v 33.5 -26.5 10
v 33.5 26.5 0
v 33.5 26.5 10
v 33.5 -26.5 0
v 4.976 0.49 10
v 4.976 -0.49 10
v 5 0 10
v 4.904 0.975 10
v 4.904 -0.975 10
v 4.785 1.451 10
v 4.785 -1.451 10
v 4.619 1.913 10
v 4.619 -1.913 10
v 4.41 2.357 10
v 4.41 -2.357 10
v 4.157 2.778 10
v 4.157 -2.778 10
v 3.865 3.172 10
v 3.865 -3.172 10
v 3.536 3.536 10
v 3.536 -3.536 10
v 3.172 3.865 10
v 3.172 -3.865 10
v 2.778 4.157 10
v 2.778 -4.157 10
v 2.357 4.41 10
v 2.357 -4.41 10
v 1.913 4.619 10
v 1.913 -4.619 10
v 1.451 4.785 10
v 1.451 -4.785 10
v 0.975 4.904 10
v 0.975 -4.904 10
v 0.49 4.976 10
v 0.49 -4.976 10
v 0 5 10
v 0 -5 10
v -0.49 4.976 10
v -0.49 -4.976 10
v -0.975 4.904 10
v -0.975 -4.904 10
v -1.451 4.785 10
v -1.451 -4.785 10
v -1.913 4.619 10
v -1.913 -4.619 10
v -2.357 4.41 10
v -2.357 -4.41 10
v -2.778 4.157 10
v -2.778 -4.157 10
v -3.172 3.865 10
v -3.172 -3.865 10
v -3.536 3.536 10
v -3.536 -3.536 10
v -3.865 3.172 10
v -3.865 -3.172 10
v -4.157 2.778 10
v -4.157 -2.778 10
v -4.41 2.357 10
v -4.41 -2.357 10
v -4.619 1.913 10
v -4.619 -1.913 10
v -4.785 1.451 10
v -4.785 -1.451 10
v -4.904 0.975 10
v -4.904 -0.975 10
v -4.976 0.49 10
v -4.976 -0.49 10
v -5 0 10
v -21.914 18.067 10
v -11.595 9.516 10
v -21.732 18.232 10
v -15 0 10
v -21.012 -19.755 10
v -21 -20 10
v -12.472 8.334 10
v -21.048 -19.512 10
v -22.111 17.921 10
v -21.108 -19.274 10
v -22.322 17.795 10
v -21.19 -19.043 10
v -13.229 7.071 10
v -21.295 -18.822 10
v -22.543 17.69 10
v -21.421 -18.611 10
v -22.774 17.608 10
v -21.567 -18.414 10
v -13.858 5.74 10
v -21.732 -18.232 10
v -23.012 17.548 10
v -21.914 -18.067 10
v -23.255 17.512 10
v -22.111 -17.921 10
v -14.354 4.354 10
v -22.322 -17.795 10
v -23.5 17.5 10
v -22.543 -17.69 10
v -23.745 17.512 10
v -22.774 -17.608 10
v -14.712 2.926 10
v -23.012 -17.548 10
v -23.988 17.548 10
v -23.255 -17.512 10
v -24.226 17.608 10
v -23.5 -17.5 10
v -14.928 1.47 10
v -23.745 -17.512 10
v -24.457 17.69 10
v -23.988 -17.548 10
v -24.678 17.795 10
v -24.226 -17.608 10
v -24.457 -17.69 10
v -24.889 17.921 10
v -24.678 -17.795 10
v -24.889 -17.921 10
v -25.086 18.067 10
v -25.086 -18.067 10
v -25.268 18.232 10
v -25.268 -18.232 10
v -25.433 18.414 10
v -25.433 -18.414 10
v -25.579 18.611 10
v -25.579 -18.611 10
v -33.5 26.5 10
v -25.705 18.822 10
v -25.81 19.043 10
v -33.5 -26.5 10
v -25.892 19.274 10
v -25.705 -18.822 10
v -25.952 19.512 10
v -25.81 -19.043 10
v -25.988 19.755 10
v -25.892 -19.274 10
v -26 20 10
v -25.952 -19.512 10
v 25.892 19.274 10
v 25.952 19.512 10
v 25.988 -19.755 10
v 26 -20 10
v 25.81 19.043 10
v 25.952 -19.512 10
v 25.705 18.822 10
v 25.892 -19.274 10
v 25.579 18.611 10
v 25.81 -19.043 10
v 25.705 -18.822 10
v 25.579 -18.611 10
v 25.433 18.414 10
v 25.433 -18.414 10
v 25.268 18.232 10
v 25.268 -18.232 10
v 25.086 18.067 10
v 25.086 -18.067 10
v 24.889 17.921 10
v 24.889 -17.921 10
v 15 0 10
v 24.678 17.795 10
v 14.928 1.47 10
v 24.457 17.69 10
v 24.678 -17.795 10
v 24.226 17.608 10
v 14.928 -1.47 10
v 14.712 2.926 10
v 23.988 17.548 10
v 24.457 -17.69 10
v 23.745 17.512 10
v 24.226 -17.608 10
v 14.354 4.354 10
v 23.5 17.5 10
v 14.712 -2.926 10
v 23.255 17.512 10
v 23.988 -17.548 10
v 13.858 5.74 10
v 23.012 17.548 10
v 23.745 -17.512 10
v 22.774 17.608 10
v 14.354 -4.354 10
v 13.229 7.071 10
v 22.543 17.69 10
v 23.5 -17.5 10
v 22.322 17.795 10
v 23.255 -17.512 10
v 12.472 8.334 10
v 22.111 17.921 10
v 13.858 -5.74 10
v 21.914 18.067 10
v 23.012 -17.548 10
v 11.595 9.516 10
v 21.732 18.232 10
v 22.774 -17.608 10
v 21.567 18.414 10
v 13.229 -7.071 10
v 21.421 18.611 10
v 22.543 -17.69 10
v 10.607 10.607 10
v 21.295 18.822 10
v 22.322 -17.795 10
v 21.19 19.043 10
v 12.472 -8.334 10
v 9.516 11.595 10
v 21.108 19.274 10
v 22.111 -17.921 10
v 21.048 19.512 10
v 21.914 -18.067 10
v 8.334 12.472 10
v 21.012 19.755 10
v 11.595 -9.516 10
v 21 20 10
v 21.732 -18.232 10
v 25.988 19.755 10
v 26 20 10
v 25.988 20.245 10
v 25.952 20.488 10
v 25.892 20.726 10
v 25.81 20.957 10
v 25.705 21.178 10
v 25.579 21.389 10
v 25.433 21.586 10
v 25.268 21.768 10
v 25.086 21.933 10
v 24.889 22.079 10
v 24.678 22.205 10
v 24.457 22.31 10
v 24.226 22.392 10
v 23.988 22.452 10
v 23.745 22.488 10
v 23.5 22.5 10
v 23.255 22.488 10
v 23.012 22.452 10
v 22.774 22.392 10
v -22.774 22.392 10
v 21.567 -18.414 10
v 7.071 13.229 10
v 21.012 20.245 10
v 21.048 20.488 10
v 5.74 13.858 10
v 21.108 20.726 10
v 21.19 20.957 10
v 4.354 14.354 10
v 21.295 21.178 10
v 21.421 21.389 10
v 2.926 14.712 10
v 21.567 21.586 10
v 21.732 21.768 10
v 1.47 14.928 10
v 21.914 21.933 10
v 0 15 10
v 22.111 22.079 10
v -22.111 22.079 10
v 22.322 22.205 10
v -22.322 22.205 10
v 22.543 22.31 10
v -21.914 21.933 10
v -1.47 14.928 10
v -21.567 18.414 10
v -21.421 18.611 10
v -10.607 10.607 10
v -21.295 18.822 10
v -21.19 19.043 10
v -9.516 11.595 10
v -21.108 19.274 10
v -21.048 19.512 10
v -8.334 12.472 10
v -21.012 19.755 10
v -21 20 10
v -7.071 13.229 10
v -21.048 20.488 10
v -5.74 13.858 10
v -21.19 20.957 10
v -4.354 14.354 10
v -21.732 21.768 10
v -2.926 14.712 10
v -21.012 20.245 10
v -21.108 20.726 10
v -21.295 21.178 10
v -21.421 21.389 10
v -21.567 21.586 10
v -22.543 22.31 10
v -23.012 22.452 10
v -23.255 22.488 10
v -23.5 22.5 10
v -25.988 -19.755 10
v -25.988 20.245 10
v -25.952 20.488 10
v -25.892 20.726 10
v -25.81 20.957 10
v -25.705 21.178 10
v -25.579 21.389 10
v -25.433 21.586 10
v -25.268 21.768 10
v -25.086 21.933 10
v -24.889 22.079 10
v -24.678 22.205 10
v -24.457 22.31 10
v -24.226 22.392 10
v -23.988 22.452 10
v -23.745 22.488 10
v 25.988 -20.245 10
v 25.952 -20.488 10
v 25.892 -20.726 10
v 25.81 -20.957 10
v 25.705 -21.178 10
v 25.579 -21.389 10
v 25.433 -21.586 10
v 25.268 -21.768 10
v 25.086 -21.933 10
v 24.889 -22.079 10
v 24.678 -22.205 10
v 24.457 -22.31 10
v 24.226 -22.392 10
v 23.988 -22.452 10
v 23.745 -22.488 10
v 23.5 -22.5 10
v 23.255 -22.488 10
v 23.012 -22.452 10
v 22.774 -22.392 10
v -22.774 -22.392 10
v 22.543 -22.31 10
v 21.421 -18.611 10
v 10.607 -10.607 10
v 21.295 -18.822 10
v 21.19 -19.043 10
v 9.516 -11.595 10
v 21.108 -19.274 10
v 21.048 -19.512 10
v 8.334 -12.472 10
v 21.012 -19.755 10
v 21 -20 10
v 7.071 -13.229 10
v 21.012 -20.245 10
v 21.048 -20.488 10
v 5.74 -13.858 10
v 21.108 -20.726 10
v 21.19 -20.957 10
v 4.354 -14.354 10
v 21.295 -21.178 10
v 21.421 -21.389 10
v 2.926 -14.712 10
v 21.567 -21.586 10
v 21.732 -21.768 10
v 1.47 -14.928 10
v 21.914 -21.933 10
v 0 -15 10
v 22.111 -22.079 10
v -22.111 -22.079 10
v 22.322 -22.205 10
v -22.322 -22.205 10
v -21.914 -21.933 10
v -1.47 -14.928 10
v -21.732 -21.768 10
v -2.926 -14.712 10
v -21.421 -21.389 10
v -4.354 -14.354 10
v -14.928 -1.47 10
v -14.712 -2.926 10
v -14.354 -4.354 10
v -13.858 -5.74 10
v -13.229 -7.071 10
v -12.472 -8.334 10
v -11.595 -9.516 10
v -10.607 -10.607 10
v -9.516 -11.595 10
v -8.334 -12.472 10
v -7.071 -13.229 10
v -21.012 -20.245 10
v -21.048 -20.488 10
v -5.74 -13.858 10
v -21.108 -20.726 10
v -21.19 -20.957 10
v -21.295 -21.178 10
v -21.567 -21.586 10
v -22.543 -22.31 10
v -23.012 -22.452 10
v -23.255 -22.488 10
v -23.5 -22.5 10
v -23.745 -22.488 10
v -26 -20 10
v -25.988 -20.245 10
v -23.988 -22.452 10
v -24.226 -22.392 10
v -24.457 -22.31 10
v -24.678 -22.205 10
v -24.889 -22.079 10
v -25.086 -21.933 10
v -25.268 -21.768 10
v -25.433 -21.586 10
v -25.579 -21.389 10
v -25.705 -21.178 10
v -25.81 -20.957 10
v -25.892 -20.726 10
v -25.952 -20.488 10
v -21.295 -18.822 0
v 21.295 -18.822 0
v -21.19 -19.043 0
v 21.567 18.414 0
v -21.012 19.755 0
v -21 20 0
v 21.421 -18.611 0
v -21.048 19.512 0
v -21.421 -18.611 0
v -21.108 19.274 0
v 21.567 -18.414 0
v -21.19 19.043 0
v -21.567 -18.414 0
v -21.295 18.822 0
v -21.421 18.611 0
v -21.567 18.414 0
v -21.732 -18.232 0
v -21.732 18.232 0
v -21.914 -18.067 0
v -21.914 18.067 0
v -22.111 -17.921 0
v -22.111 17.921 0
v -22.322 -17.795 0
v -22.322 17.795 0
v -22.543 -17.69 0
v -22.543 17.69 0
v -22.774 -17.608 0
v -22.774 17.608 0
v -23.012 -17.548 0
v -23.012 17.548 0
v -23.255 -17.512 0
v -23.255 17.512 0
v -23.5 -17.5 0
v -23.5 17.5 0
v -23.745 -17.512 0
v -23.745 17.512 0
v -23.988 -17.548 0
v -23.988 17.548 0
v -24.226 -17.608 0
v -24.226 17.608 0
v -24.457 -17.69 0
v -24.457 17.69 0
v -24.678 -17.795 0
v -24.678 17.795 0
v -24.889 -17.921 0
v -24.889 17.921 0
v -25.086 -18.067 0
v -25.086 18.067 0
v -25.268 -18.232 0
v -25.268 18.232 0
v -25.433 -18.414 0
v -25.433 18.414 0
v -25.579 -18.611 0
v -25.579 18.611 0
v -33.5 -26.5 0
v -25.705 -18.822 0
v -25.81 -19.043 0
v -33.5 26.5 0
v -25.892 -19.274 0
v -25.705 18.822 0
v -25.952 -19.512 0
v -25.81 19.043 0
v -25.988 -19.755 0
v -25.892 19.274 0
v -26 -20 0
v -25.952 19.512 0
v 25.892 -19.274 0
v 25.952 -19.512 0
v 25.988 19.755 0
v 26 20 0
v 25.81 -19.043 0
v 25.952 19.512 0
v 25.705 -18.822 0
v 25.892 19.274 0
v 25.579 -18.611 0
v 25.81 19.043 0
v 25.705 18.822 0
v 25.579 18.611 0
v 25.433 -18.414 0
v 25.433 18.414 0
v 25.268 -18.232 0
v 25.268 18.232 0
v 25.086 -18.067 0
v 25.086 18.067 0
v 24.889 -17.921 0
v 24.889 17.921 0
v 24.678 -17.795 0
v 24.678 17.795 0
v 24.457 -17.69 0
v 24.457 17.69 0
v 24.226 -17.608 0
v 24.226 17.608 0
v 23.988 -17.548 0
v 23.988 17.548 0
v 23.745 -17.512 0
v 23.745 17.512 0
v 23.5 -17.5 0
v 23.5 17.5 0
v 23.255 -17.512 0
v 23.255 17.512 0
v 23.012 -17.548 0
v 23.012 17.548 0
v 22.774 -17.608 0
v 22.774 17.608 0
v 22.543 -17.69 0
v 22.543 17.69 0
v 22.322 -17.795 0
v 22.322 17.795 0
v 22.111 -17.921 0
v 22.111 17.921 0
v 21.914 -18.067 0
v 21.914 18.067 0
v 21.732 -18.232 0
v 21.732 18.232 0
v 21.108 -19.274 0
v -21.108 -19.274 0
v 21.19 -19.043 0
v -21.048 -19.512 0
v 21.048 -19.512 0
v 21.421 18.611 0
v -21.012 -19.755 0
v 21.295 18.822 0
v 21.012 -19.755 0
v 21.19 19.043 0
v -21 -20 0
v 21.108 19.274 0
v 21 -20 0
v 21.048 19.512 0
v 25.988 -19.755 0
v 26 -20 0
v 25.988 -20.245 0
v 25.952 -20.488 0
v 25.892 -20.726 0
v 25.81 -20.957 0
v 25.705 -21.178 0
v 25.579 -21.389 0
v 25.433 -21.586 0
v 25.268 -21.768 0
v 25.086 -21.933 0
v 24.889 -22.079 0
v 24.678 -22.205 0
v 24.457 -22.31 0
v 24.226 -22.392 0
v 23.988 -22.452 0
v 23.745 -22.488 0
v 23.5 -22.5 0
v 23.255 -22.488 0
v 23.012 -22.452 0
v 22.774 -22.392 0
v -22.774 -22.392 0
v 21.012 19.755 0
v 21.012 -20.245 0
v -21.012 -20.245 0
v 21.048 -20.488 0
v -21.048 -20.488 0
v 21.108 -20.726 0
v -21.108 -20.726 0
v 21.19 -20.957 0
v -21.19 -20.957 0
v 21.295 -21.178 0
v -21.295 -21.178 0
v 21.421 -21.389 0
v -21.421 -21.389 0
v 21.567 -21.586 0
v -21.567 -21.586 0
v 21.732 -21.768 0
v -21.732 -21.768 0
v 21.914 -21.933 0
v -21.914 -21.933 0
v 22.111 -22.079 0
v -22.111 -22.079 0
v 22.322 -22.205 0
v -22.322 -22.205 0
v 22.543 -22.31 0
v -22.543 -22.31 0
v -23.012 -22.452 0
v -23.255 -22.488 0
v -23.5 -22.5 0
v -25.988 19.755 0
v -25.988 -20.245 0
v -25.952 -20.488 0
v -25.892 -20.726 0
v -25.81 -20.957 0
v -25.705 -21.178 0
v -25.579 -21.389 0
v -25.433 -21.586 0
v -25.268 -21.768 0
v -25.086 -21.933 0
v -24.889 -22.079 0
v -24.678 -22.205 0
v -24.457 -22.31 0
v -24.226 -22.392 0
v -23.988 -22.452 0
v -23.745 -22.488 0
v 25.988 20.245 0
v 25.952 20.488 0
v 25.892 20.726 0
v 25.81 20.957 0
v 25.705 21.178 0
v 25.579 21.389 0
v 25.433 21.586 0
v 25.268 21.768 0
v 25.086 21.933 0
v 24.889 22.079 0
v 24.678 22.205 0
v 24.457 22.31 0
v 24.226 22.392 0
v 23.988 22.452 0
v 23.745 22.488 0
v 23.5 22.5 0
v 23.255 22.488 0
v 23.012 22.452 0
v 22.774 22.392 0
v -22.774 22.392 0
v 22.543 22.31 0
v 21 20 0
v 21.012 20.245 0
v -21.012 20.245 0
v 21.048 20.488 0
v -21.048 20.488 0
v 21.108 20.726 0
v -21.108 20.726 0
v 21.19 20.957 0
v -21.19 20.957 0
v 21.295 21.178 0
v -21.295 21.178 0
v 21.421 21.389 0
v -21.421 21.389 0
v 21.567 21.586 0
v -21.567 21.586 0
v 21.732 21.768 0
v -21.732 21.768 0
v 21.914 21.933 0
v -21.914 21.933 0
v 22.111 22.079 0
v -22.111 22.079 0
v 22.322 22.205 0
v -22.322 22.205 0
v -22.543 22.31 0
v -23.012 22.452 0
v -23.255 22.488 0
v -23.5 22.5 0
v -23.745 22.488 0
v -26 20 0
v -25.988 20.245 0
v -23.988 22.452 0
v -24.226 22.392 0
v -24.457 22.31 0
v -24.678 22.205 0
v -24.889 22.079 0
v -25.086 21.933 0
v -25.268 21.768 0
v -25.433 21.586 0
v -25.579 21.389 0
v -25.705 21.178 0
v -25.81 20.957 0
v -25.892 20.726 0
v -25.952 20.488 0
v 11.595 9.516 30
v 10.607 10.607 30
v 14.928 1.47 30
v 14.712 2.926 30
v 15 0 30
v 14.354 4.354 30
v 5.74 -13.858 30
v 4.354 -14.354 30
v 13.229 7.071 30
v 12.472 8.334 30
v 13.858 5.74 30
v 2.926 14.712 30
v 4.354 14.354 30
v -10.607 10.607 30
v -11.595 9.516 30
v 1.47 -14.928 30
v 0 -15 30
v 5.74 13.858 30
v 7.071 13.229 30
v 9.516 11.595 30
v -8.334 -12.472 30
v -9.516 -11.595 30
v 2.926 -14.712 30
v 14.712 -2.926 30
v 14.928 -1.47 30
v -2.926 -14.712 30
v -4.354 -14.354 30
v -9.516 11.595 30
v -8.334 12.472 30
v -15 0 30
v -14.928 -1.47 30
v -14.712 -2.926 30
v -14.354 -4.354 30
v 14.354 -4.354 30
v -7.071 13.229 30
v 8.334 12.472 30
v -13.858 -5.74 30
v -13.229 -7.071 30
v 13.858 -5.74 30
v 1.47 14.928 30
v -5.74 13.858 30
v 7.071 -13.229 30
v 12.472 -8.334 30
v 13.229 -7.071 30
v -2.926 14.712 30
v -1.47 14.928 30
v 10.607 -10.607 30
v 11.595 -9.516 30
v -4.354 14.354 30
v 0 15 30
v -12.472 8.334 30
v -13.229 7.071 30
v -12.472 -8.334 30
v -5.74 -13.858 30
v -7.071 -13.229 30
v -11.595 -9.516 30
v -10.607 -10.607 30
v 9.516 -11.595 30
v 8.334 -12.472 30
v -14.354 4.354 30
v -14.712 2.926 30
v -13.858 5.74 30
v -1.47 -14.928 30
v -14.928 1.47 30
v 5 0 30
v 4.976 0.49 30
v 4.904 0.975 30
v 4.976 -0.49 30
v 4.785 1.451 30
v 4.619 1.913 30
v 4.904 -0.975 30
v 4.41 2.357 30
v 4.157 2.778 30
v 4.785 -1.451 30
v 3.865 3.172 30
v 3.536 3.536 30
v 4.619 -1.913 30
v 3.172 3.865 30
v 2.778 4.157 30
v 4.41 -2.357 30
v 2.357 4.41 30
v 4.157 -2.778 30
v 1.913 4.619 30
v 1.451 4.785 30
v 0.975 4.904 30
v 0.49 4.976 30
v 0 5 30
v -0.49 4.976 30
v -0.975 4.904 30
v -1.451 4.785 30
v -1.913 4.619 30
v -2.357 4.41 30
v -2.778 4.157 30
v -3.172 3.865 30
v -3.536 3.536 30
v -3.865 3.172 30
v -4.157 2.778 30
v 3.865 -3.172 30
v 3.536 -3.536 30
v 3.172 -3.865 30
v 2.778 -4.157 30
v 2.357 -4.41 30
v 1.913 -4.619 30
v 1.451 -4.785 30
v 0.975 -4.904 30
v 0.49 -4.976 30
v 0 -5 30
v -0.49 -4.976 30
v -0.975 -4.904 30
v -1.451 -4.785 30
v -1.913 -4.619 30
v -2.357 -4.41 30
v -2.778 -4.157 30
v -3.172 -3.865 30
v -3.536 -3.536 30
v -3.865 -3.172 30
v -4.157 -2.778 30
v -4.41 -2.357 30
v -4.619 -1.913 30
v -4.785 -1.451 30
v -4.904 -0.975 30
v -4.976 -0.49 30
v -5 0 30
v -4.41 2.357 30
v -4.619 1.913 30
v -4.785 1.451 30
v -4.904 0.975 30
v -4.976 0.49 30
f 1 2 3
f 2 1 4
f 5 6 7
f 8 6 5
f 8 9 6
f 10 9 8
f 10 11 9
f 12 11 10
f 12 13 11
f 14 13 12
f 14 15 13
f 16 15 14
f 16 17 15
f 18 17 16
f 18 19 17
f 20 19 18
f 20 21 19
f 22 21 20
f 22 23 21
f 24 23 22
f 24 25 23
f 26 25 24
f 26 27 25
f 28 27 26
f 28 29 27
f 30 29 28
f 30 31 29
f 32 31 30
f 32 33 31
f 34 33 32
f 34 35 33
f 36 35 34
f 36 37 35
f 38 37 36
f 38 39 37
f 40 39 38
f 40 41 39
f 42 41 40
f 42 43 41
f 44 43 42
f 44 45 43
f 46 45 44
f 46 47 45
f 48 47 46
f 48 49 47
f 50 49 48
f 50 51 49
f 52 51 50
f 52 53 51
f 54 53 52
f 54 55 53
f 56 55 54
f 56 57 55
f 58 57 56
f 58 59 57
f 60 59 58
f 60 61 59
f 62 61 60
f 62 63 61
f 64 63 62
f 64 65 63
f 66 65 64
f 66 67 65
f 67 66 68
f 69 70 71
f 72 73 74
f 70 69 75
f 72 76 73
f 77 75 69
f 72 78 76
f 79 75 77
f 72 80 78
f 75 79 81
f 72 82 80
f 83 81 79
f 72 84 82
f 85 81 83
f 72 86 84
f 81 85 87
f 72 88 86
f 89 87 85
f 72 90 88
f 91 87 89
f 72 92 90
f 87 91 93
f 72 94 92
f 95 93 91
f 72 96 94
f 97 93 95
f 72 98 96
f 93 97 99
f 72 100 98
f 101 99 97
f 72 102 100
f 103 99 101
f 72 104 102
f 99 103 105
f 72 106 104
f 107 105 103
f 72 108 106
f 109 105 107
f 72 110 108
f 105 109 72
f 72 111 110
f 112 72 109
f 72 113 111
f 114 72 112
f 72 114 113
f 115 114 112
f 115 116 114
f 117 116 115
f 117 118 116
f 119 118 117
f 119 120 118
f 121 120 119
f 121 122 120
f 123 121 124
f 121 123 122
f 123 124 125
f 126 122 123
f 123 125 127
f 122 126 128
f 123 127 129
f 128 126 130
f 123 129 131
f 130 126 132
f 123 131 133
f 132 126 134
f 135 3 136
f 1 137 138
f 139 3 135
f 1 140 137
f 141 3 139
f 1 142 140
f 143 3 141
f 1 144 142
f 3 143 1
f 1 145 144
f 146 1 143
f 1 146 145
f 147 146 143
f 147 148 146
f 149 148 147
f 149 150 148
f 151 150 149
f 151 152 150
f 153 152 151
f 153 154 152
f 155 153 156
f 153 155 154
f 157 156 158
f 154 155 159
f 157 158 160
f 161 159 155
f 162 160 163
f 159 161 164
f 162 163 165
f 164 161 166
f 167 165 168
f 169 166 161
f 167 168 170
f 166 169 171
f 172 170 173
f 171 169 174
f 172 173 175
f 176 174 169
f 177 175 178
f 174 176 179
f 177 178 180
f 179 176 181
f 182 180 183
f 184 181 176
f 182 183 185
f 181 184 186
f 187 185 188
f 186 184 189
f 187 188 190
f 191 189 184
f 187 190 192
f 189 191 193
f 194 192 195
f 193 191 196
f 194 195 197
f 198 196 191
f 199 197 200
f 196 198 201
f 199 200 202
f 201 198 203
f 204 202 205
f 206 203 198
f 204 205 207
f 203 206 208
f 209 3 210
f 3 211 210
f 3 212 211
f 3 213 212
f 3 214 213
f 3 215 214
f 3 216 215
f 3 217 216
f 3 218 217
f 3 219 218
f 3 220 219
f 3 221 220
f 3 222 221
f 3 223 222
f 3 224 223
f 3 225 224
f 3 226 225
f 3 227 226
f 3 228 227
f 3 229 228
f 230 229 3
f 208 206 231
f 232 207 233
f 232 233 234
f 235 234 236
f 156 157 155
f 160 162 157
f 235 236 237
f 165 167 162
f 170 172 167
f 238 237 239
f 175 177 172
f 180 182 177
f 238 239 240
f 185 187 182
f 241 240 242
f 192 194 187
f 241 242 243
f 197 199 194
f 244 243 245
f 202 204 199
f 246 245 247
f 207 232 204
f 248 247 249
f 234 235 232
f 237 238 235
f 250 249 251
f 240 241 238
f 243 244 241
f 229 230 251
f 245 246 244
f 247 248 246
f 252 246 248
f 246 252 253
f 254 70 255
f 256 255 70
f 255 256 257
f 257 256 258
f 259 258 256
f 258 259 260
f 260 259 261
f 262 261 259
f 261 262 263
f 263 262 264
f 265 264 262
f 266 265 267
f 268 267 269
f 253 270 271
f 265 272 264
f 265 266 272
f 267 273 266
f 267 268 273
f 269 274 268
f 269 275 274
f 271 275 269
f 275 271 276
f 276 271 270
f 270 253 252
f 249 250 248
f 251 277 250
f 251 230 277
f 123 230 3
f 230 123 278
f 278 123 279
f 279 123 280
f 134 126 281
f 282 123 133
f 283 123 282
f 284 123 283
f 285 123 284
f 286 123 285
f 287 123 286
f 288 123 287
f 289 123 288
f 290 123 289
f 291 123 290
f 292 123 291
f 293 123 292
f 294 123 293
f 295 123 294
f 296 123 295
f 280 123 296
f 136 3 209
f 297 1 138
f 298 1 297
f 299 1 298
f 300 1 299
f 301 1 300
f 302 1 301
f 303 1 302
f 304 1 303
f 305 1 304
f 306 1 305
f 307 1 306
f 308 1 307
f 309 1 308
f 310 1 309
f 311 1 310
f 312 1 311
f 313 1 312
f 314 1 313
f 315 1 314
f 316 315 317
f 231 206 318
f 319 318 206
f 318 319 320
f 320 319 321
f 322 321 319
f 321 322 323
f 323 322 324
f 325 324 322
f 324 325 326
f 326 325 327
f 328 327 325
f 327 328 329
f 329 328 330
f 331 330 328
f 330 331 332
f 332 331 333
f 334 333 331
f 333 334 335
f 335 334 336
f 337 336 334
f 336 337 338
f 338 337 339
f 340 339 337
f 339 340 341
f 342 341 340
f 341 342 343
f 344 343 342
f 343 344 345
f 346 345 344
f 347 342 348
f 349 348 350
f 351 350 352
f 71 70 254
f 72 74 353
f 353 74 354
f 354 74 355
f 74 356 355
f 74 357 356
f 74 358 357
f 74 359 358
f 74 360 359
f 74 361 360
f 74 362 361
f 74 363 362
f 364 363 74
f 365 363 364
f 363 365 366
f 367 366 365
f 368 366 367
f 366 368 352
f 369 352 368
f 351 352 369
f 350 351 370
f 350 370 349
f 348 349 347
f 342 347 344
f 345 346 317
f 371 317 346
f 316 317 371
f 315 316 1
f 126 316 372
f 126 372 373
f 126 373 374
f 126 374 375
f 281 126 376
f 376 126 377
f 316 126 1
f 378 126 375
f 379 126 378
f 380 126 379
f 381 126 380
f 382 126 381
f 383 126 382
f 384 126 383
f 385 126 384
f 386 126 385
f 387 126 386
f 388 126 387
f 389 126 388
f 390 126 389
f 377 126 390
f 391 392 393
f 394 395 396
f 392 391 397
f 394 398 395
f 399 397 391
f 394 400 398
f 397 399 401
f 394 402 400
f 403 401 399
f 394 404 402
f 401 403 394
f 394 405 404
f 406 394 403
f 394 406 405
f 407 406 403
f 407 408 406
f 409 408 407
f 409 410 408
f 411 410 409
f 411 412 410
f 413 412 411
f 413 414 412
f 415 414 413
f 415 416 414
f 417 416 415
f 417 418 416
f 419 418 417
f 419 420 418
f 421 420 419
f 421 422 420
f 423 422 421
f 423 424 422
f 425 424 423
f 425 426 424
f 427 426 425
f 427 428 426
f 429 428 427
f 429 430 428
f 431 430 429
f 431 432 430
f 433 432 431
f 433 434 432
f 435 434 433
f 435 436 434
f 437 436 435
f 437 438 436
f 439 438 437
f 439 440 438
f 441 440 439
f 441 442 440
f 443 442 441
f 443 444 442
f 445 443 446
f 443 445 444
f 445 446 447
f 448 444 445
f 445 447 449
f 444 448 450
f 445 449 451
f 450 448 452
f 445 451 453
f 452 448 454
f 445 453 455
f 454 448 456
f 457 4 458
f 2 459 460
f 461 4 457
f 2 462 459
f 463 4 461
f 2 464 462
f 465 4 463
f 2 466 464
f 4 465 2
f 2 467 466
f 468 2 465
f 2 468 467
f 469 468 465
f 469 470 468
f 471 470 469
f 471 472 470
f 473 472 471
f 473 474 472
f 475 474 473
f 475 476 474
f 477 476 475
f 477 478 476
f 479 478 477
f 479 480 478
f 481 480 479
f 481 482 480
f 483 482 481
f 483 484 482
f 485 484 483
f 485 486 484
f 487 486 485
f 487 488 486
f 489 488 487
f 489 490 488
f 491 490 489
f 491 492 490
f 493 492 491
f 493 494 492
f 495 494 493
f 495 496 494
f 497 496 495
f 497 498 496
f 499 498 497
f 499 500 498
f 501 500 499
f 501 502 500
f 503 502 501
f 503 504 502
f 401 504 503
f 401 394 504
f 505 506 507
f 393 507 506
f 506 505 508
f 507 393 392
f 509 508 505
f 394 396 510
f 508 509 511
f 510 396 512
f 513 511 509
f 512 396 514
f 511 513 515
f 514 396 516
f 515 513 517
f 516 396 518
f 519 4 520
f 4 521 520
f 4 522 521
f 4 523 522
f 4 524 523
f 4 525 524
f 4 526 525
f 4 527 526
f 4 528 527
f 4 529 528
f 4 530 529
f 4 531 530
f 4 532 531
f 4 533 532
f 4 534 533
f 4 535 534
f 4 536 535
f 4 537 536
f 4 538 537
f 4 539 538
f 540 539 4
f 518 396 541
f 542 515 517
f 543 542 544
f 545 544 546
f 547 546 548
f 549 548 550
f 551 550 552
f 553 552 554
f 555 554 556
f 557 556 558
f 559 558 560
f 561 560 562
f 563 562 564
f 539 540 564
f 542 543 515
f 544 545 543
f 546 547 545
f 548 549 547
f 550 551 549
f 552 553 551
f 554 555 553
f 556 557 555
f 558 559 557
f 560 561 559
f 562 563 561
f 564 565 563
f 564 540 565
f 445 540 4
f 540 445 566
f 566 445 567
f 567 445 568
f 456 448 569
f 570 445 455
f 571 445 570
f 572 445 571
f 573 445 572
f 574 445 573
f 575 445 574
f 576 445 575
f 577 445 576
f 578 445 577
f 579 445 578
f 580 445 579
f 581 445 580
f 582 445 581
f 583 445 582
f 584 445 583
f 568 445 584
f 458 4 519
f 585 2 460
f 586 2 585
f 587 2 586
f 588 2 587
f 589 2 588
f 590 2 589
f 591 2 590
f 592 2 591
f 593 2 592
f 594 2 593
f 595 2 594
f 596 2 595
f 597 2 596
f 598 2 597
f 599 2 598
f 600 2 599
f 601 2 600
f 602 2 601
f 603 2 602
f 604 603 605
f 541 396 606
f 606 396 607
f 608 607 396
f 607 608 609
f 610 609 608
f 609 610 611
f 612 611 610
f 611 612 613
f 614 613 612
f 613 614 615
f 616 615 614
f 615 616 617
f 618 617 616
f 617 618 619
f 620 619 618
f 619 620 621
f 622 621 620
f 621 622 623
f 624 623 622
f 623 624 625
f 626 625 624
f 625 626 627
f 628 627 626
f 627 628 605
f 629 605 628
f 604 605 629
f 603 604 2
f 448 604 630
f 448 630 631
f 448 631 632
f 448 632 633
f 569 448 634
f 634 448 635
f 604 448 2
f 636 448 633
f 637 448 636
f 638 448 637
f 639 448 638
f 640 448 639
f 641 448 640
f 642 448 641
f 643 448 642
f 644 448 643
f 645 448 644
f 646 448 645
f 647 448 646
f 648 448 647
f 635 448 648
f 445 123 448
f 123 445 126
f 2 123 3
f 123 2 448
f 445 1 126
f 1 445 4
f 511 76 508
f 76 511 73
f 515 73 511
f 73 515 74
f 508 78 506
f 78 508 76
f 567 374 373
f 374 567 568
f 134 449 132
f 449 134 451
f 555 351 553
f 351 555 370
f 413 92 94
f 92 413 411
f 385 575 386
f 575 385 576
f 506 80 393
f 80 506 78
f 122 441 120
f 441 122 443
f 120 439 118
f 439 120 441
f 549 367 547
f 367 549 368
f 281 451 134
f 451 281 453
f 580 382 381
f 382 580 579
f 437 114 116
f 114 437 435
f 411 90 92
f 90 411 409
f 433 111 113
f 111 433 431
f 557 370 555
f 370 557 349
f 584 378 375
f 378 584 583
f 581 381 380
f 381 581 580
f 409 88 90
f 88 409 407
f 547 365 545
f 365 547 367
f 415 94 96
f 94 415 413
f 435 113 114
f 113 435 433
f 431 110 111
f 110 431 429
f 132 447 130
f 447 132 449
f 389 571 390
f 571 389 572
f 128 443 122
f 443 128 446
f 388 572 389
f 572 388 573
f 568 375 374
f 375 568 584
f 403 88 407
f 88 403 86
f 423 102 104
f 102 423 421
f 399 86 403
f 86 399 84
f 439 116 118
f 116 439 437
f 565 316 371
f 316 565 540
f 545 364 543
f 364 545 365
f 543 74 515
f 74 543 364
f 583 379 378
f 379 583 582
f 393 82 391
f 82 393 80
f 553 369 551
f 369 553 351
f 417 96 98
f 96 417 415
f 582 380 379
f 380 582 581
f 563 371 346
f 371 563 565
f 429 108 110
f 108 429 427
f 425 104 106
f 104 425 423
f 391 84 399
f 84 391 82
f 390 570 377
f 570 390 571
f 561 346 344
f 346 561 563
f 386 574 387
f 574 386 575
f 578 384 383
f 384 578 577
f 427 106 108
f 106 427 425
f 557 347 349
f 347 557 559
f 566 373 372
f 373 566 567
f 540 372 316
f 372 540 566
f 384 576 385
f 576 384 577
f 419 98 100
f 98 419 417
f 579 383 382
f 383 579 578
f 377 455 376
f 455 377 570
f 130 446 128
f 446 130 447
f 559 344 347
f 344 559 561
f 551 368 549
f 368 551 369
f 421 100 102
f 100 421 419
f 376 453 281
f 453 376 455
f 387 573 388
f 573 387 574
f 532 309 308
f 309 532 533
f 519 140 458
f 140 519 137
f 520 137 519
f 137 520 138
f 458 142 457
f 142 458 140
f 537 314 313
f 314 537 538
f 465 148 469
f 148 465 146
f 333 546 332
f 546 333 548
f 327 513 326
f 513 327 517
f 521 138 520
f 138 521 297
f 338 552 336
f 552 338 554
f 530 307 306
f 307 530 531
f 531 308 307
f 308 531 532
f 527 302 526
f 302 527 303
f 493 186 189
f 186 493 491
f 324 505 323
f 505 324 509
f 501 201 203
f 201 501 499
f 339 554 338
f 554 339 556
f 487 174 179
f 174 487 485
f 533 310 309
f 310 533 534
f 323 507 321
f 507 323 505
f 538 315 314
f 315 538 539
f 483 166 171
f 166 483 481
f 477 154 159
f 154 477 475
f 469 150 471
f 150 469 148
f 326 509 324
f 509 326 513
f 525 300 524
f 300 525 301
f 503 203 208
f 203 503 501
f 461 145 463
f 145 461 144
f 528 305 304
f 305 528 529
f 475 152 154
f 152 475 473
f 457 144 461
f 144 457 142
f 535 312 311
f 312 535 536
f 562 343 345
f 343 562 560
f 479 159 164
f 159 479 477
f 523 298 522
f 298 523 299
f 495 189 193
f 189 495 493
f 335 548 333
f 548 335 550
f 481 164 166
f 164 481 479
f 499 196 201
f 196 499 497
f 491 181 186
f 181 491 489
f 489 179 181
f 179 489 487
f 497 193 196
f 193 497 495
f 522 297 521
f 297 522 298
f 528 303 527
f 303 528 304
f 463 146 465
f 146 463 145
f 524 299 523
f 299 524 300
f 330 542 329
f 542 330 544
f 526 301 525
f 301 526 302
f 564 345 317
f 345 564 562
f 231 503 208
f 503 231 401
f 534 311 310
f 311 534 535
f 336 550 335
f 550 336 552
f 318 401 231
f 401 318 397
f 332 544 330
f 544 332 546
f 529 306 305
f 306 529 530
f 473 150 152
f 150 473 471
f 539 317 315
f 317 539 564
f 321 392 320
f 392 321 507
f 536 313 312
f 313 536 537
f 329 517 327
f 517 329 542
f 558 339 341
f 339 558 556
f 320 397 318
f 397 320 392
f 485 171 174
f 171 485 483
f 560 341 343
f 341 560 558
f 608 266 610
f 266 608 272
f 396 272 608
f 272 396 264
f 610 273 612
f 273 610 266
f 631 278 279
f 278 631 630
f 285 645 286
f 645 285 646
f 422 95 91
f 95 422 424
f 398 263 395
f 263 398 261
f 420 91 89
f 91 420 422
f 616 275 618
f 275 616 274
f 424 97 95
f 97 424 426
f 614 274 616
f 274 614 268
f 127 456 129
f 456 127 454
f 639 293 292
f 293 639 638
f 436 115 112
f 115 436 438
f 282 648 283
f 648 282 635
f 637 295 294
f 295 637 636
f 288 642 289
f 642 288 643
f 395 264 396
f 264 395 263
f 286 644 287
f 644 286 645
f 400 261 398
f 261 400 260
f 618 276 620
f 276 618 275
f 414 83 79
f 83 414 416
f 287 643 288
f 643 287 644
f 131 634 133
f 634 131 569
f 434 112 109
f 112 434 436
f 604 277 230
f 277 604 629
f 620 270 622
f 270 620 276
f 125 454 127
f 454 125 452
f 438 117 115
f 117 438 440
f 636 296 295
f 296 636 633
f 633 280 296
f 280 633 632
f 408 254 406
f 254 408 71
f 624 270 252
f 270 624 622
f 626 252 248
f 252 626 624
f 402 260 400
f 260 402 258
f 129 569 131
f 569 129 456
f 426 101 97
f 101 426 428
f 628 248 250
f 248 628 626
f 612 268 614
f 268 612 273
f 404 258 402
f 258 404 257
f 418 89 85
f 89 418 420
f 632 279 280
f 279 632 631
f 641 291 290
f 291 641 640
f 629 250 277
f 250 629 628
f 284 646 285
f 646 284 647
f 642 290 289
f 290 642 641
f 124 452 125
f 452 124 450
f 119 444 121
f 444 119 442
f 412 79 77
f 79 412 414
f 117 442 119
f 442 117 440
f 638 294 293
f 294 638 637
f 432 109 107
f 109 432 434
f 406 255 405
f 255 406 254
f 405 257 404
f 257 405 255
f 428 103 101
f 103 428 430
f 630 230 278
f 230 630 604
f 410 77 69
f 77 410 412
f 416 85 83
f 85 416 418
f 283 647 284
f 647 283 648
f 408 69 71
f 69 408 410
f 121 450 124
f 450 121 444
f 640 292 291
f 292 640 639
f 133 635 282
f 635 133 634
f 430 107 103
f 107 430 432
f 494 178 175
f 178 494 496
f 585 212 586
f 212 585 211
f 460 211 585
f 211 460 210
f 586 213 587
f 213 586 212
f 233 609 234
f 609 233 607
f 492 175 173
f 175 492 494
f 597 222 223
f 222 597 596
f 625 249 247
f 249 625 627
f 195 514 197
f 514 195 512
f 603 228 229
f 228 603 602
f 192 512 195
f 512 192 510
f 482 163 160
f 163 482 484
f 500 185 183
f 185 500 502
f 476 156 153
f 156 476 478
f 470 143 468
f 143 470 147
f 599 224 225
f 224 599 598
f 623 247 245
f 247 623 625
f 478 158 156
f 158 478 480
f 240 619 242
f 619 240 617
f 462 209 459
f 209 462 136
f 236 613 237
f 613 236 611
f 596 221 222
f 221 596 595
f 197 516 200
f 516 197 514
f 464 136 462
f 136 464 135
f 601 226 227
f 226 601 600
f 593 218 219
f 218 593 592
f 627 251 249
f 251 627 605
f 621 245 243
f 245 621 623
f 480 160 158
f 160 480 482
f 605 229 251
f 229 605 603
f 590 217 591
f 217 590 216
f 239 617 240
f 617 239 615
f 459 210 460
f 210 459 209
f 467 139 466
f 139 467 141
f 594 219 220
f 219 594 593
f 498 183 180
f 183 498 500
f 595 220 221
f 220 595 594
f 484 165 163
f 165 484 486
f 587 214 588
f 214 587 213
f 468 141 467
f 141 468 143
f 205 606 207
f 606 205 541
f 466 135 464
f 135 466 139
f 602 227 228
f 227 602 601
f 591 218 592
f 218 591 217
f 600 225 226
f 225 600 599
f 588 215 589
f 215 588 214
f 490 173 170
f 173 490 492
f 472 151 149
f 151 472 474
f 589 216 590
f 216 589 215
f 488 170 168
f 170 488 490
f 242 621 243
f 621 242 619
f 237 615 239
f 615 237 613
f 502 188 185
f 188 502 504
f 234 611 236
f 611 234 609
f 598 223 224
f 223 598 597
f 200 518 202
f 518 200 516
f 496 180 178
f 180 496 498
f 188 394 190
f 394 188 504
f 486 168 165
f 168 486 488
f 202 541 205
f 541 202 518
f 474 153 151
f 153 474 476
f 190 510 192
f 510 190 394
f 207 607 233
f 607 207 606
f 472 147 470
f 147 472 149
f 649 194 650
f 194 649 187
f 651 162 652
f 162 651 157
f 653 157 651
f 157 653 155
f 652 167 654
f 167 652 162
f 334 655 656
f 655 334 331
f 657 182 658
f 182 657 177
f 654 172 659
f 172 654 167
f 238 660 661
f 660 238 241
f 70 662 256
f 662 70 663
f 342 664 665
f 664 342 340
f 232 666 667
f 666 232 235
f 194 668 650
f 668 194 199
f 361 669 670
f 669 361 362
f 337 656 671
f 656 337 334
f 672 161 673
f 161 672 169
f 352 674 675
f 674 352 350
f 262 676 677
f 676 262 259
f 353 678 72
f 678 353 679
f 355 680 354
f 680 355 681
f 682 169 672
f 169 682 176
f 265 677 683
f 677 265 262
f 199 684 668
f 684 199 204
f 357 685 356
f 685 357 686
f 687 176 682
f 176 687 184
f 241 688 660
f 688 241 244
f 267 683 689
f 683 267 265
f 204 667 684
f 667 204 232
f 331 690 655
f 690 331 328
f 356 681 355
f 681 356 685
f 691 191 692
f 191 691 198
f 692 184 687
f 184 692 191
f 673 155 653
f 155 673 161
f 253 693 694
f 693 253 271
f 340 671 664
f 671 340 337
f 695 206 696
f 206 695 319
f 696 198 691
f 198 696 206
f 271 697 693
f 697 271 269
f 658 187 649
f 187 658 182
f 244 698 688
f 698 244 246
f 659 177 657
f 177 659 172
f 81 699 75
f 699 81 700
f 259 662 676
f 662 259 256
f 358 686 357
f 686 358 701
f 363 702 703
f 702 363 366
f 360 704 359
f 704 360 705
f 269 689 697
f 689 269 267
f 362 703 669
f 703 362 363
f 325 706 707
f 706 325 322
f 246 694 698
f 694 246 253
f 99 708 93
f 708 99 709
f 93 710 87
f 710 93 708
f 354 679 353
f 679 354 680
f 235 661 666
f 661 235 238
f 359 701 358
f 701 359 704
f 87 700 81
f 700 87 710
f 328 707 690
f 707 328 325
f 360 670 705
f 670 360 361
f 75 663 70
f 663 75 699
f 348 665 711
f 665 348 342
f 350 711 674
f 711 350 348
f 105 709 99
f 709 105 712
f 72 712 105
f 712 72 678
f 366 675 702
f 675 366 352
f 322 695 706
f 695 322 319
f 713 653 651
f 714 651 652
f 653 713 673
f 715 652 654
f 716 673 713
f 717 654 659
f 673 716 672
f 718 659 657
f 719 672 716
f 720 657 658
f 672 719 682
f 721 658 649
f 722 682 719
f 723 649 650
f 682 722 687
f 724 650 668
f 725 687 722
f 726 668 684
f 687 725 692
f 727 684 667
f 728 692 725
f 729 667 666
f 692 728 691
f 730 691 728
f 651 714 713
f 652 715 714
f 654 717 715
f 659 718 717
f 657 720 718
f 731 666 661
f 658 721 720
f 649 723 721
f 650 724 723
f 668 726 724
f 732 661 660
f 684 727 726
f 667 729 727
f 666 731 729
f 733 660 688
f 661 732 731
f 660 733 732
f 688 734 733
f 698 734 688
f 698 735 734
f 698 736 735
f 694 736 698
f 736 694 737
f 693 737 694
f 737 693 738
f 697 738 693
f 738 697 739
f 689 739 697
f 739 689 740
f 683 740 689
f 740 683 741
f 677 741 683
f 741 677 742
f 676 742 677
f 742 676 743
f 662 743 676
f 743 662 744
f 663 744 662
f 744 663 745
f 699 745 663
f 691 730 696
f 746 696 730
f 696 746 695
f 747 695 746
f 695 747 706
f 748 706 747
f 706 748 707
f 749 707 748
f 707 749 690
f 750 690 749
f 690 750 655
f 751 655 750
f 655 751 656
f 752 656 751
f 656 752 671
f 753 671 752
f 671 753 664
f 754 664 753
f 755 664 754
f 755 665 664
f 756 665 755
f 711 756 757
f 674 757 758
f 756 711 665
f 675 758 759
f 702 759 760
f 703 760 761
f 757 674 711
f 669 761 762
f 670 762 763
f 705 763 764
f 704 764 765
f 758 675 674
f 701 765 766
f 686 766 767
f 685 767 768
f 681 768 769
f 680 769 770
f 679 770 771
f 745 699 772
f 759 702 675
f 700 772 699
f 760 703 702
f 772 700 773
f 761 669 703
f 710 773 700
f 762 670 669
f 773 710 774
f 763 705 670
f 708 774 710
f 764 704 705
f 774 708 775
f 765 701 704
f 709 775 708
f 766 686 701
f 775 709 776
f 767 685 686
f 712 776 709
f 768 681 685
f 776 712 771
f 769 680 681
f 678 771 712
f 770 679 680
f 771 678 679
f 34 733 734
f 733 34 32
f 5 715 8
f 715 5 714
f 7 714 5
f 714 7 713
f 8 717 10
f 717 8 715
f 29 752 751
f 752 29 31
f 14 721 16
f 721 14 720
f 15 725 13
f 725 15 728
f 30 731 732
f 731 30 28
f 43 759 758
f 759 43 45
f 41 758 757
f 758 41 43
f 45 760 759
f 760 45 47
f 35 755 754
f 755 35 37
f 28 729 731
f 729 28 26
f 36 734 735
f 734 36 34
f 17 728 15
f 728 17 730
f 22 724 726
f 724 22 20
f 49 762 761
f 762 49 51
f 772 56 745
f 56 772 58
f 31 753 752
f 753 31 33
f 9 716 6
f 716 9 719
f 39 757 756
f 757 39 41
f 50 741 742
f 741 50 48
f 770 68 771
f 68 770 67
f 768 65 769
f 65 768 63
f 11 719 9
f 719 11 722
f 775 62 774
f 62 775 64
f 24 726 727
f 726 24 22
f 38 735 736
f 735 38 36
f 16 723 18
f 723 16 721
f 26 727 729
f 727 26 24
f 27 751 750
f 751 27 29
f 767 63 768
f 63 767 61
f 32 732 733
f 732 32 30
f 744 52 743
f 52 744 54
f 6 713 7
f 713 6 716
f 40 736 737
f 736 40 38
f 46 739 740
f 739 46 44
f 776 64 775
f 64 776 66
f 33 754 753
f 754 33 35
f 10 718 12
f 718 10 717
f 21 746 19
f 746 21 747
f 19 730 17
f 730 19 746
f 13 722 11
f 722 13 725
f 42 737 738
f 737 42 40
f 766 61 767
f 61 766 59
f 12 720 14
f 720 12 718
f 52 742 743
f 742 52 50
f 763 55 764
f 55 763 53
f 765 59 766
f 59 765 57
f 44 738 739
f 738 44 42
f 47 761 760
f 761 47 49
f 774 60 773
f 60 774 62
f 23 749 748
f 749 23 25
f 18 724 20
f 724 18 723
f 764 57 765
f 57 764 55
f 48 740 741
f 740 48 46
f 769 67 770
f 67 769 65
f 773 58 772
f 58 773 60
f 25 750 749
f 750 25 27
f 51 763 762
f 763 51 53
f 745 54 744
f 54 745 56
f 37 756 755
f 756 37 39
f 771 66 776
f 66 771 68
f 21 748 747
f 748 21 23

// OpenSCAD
module pillow_block_bearing() {
    base_length = 67.0;
    base_width = 53.0;
    base_height = 10.0;
    bearing_diameter = 30.0;
    bearing_height = 20.0;
    shaft_diameter = 10.0;
    hole_diameter = 5.0;
    hole_offset = 20.0;
    hole_spacing = 47.0;
    $fn = 64;

    // Base
    difference() {
        translate([-base_length/2, -base_width/2, 0])
            cube([base_length, base_width, base_height]);
        // Holes for mounting
        translate([-hole_spacing/2, -hole_offset, -1])
            cylinder(h = base_height + 2, d = hole_diameter);
        translate([hole_spacing/2, -hole_offset, -1])
            cylinder(h = base_height + 2, d = hole_diameter);
        translate([-hole_spacing/2, hole_offset, -1])
            cylinder(h = base_height + 2, d = hole_diameter);
        translate([hole_spacing/2, hole_offset, -1])
            cylinder(h = base_height + 2, d = hole_diameter);
    }

    // Bearing
    translate([0, 0, base_height])
        difference() {
            cylinder(h = bearing_height, d = bearing_diameter);
            translate([0, 0, -1])
                cylinder(h = bearing_height + 2, d = shaft_diameter);
        }
}

pillow_block_bearing();
